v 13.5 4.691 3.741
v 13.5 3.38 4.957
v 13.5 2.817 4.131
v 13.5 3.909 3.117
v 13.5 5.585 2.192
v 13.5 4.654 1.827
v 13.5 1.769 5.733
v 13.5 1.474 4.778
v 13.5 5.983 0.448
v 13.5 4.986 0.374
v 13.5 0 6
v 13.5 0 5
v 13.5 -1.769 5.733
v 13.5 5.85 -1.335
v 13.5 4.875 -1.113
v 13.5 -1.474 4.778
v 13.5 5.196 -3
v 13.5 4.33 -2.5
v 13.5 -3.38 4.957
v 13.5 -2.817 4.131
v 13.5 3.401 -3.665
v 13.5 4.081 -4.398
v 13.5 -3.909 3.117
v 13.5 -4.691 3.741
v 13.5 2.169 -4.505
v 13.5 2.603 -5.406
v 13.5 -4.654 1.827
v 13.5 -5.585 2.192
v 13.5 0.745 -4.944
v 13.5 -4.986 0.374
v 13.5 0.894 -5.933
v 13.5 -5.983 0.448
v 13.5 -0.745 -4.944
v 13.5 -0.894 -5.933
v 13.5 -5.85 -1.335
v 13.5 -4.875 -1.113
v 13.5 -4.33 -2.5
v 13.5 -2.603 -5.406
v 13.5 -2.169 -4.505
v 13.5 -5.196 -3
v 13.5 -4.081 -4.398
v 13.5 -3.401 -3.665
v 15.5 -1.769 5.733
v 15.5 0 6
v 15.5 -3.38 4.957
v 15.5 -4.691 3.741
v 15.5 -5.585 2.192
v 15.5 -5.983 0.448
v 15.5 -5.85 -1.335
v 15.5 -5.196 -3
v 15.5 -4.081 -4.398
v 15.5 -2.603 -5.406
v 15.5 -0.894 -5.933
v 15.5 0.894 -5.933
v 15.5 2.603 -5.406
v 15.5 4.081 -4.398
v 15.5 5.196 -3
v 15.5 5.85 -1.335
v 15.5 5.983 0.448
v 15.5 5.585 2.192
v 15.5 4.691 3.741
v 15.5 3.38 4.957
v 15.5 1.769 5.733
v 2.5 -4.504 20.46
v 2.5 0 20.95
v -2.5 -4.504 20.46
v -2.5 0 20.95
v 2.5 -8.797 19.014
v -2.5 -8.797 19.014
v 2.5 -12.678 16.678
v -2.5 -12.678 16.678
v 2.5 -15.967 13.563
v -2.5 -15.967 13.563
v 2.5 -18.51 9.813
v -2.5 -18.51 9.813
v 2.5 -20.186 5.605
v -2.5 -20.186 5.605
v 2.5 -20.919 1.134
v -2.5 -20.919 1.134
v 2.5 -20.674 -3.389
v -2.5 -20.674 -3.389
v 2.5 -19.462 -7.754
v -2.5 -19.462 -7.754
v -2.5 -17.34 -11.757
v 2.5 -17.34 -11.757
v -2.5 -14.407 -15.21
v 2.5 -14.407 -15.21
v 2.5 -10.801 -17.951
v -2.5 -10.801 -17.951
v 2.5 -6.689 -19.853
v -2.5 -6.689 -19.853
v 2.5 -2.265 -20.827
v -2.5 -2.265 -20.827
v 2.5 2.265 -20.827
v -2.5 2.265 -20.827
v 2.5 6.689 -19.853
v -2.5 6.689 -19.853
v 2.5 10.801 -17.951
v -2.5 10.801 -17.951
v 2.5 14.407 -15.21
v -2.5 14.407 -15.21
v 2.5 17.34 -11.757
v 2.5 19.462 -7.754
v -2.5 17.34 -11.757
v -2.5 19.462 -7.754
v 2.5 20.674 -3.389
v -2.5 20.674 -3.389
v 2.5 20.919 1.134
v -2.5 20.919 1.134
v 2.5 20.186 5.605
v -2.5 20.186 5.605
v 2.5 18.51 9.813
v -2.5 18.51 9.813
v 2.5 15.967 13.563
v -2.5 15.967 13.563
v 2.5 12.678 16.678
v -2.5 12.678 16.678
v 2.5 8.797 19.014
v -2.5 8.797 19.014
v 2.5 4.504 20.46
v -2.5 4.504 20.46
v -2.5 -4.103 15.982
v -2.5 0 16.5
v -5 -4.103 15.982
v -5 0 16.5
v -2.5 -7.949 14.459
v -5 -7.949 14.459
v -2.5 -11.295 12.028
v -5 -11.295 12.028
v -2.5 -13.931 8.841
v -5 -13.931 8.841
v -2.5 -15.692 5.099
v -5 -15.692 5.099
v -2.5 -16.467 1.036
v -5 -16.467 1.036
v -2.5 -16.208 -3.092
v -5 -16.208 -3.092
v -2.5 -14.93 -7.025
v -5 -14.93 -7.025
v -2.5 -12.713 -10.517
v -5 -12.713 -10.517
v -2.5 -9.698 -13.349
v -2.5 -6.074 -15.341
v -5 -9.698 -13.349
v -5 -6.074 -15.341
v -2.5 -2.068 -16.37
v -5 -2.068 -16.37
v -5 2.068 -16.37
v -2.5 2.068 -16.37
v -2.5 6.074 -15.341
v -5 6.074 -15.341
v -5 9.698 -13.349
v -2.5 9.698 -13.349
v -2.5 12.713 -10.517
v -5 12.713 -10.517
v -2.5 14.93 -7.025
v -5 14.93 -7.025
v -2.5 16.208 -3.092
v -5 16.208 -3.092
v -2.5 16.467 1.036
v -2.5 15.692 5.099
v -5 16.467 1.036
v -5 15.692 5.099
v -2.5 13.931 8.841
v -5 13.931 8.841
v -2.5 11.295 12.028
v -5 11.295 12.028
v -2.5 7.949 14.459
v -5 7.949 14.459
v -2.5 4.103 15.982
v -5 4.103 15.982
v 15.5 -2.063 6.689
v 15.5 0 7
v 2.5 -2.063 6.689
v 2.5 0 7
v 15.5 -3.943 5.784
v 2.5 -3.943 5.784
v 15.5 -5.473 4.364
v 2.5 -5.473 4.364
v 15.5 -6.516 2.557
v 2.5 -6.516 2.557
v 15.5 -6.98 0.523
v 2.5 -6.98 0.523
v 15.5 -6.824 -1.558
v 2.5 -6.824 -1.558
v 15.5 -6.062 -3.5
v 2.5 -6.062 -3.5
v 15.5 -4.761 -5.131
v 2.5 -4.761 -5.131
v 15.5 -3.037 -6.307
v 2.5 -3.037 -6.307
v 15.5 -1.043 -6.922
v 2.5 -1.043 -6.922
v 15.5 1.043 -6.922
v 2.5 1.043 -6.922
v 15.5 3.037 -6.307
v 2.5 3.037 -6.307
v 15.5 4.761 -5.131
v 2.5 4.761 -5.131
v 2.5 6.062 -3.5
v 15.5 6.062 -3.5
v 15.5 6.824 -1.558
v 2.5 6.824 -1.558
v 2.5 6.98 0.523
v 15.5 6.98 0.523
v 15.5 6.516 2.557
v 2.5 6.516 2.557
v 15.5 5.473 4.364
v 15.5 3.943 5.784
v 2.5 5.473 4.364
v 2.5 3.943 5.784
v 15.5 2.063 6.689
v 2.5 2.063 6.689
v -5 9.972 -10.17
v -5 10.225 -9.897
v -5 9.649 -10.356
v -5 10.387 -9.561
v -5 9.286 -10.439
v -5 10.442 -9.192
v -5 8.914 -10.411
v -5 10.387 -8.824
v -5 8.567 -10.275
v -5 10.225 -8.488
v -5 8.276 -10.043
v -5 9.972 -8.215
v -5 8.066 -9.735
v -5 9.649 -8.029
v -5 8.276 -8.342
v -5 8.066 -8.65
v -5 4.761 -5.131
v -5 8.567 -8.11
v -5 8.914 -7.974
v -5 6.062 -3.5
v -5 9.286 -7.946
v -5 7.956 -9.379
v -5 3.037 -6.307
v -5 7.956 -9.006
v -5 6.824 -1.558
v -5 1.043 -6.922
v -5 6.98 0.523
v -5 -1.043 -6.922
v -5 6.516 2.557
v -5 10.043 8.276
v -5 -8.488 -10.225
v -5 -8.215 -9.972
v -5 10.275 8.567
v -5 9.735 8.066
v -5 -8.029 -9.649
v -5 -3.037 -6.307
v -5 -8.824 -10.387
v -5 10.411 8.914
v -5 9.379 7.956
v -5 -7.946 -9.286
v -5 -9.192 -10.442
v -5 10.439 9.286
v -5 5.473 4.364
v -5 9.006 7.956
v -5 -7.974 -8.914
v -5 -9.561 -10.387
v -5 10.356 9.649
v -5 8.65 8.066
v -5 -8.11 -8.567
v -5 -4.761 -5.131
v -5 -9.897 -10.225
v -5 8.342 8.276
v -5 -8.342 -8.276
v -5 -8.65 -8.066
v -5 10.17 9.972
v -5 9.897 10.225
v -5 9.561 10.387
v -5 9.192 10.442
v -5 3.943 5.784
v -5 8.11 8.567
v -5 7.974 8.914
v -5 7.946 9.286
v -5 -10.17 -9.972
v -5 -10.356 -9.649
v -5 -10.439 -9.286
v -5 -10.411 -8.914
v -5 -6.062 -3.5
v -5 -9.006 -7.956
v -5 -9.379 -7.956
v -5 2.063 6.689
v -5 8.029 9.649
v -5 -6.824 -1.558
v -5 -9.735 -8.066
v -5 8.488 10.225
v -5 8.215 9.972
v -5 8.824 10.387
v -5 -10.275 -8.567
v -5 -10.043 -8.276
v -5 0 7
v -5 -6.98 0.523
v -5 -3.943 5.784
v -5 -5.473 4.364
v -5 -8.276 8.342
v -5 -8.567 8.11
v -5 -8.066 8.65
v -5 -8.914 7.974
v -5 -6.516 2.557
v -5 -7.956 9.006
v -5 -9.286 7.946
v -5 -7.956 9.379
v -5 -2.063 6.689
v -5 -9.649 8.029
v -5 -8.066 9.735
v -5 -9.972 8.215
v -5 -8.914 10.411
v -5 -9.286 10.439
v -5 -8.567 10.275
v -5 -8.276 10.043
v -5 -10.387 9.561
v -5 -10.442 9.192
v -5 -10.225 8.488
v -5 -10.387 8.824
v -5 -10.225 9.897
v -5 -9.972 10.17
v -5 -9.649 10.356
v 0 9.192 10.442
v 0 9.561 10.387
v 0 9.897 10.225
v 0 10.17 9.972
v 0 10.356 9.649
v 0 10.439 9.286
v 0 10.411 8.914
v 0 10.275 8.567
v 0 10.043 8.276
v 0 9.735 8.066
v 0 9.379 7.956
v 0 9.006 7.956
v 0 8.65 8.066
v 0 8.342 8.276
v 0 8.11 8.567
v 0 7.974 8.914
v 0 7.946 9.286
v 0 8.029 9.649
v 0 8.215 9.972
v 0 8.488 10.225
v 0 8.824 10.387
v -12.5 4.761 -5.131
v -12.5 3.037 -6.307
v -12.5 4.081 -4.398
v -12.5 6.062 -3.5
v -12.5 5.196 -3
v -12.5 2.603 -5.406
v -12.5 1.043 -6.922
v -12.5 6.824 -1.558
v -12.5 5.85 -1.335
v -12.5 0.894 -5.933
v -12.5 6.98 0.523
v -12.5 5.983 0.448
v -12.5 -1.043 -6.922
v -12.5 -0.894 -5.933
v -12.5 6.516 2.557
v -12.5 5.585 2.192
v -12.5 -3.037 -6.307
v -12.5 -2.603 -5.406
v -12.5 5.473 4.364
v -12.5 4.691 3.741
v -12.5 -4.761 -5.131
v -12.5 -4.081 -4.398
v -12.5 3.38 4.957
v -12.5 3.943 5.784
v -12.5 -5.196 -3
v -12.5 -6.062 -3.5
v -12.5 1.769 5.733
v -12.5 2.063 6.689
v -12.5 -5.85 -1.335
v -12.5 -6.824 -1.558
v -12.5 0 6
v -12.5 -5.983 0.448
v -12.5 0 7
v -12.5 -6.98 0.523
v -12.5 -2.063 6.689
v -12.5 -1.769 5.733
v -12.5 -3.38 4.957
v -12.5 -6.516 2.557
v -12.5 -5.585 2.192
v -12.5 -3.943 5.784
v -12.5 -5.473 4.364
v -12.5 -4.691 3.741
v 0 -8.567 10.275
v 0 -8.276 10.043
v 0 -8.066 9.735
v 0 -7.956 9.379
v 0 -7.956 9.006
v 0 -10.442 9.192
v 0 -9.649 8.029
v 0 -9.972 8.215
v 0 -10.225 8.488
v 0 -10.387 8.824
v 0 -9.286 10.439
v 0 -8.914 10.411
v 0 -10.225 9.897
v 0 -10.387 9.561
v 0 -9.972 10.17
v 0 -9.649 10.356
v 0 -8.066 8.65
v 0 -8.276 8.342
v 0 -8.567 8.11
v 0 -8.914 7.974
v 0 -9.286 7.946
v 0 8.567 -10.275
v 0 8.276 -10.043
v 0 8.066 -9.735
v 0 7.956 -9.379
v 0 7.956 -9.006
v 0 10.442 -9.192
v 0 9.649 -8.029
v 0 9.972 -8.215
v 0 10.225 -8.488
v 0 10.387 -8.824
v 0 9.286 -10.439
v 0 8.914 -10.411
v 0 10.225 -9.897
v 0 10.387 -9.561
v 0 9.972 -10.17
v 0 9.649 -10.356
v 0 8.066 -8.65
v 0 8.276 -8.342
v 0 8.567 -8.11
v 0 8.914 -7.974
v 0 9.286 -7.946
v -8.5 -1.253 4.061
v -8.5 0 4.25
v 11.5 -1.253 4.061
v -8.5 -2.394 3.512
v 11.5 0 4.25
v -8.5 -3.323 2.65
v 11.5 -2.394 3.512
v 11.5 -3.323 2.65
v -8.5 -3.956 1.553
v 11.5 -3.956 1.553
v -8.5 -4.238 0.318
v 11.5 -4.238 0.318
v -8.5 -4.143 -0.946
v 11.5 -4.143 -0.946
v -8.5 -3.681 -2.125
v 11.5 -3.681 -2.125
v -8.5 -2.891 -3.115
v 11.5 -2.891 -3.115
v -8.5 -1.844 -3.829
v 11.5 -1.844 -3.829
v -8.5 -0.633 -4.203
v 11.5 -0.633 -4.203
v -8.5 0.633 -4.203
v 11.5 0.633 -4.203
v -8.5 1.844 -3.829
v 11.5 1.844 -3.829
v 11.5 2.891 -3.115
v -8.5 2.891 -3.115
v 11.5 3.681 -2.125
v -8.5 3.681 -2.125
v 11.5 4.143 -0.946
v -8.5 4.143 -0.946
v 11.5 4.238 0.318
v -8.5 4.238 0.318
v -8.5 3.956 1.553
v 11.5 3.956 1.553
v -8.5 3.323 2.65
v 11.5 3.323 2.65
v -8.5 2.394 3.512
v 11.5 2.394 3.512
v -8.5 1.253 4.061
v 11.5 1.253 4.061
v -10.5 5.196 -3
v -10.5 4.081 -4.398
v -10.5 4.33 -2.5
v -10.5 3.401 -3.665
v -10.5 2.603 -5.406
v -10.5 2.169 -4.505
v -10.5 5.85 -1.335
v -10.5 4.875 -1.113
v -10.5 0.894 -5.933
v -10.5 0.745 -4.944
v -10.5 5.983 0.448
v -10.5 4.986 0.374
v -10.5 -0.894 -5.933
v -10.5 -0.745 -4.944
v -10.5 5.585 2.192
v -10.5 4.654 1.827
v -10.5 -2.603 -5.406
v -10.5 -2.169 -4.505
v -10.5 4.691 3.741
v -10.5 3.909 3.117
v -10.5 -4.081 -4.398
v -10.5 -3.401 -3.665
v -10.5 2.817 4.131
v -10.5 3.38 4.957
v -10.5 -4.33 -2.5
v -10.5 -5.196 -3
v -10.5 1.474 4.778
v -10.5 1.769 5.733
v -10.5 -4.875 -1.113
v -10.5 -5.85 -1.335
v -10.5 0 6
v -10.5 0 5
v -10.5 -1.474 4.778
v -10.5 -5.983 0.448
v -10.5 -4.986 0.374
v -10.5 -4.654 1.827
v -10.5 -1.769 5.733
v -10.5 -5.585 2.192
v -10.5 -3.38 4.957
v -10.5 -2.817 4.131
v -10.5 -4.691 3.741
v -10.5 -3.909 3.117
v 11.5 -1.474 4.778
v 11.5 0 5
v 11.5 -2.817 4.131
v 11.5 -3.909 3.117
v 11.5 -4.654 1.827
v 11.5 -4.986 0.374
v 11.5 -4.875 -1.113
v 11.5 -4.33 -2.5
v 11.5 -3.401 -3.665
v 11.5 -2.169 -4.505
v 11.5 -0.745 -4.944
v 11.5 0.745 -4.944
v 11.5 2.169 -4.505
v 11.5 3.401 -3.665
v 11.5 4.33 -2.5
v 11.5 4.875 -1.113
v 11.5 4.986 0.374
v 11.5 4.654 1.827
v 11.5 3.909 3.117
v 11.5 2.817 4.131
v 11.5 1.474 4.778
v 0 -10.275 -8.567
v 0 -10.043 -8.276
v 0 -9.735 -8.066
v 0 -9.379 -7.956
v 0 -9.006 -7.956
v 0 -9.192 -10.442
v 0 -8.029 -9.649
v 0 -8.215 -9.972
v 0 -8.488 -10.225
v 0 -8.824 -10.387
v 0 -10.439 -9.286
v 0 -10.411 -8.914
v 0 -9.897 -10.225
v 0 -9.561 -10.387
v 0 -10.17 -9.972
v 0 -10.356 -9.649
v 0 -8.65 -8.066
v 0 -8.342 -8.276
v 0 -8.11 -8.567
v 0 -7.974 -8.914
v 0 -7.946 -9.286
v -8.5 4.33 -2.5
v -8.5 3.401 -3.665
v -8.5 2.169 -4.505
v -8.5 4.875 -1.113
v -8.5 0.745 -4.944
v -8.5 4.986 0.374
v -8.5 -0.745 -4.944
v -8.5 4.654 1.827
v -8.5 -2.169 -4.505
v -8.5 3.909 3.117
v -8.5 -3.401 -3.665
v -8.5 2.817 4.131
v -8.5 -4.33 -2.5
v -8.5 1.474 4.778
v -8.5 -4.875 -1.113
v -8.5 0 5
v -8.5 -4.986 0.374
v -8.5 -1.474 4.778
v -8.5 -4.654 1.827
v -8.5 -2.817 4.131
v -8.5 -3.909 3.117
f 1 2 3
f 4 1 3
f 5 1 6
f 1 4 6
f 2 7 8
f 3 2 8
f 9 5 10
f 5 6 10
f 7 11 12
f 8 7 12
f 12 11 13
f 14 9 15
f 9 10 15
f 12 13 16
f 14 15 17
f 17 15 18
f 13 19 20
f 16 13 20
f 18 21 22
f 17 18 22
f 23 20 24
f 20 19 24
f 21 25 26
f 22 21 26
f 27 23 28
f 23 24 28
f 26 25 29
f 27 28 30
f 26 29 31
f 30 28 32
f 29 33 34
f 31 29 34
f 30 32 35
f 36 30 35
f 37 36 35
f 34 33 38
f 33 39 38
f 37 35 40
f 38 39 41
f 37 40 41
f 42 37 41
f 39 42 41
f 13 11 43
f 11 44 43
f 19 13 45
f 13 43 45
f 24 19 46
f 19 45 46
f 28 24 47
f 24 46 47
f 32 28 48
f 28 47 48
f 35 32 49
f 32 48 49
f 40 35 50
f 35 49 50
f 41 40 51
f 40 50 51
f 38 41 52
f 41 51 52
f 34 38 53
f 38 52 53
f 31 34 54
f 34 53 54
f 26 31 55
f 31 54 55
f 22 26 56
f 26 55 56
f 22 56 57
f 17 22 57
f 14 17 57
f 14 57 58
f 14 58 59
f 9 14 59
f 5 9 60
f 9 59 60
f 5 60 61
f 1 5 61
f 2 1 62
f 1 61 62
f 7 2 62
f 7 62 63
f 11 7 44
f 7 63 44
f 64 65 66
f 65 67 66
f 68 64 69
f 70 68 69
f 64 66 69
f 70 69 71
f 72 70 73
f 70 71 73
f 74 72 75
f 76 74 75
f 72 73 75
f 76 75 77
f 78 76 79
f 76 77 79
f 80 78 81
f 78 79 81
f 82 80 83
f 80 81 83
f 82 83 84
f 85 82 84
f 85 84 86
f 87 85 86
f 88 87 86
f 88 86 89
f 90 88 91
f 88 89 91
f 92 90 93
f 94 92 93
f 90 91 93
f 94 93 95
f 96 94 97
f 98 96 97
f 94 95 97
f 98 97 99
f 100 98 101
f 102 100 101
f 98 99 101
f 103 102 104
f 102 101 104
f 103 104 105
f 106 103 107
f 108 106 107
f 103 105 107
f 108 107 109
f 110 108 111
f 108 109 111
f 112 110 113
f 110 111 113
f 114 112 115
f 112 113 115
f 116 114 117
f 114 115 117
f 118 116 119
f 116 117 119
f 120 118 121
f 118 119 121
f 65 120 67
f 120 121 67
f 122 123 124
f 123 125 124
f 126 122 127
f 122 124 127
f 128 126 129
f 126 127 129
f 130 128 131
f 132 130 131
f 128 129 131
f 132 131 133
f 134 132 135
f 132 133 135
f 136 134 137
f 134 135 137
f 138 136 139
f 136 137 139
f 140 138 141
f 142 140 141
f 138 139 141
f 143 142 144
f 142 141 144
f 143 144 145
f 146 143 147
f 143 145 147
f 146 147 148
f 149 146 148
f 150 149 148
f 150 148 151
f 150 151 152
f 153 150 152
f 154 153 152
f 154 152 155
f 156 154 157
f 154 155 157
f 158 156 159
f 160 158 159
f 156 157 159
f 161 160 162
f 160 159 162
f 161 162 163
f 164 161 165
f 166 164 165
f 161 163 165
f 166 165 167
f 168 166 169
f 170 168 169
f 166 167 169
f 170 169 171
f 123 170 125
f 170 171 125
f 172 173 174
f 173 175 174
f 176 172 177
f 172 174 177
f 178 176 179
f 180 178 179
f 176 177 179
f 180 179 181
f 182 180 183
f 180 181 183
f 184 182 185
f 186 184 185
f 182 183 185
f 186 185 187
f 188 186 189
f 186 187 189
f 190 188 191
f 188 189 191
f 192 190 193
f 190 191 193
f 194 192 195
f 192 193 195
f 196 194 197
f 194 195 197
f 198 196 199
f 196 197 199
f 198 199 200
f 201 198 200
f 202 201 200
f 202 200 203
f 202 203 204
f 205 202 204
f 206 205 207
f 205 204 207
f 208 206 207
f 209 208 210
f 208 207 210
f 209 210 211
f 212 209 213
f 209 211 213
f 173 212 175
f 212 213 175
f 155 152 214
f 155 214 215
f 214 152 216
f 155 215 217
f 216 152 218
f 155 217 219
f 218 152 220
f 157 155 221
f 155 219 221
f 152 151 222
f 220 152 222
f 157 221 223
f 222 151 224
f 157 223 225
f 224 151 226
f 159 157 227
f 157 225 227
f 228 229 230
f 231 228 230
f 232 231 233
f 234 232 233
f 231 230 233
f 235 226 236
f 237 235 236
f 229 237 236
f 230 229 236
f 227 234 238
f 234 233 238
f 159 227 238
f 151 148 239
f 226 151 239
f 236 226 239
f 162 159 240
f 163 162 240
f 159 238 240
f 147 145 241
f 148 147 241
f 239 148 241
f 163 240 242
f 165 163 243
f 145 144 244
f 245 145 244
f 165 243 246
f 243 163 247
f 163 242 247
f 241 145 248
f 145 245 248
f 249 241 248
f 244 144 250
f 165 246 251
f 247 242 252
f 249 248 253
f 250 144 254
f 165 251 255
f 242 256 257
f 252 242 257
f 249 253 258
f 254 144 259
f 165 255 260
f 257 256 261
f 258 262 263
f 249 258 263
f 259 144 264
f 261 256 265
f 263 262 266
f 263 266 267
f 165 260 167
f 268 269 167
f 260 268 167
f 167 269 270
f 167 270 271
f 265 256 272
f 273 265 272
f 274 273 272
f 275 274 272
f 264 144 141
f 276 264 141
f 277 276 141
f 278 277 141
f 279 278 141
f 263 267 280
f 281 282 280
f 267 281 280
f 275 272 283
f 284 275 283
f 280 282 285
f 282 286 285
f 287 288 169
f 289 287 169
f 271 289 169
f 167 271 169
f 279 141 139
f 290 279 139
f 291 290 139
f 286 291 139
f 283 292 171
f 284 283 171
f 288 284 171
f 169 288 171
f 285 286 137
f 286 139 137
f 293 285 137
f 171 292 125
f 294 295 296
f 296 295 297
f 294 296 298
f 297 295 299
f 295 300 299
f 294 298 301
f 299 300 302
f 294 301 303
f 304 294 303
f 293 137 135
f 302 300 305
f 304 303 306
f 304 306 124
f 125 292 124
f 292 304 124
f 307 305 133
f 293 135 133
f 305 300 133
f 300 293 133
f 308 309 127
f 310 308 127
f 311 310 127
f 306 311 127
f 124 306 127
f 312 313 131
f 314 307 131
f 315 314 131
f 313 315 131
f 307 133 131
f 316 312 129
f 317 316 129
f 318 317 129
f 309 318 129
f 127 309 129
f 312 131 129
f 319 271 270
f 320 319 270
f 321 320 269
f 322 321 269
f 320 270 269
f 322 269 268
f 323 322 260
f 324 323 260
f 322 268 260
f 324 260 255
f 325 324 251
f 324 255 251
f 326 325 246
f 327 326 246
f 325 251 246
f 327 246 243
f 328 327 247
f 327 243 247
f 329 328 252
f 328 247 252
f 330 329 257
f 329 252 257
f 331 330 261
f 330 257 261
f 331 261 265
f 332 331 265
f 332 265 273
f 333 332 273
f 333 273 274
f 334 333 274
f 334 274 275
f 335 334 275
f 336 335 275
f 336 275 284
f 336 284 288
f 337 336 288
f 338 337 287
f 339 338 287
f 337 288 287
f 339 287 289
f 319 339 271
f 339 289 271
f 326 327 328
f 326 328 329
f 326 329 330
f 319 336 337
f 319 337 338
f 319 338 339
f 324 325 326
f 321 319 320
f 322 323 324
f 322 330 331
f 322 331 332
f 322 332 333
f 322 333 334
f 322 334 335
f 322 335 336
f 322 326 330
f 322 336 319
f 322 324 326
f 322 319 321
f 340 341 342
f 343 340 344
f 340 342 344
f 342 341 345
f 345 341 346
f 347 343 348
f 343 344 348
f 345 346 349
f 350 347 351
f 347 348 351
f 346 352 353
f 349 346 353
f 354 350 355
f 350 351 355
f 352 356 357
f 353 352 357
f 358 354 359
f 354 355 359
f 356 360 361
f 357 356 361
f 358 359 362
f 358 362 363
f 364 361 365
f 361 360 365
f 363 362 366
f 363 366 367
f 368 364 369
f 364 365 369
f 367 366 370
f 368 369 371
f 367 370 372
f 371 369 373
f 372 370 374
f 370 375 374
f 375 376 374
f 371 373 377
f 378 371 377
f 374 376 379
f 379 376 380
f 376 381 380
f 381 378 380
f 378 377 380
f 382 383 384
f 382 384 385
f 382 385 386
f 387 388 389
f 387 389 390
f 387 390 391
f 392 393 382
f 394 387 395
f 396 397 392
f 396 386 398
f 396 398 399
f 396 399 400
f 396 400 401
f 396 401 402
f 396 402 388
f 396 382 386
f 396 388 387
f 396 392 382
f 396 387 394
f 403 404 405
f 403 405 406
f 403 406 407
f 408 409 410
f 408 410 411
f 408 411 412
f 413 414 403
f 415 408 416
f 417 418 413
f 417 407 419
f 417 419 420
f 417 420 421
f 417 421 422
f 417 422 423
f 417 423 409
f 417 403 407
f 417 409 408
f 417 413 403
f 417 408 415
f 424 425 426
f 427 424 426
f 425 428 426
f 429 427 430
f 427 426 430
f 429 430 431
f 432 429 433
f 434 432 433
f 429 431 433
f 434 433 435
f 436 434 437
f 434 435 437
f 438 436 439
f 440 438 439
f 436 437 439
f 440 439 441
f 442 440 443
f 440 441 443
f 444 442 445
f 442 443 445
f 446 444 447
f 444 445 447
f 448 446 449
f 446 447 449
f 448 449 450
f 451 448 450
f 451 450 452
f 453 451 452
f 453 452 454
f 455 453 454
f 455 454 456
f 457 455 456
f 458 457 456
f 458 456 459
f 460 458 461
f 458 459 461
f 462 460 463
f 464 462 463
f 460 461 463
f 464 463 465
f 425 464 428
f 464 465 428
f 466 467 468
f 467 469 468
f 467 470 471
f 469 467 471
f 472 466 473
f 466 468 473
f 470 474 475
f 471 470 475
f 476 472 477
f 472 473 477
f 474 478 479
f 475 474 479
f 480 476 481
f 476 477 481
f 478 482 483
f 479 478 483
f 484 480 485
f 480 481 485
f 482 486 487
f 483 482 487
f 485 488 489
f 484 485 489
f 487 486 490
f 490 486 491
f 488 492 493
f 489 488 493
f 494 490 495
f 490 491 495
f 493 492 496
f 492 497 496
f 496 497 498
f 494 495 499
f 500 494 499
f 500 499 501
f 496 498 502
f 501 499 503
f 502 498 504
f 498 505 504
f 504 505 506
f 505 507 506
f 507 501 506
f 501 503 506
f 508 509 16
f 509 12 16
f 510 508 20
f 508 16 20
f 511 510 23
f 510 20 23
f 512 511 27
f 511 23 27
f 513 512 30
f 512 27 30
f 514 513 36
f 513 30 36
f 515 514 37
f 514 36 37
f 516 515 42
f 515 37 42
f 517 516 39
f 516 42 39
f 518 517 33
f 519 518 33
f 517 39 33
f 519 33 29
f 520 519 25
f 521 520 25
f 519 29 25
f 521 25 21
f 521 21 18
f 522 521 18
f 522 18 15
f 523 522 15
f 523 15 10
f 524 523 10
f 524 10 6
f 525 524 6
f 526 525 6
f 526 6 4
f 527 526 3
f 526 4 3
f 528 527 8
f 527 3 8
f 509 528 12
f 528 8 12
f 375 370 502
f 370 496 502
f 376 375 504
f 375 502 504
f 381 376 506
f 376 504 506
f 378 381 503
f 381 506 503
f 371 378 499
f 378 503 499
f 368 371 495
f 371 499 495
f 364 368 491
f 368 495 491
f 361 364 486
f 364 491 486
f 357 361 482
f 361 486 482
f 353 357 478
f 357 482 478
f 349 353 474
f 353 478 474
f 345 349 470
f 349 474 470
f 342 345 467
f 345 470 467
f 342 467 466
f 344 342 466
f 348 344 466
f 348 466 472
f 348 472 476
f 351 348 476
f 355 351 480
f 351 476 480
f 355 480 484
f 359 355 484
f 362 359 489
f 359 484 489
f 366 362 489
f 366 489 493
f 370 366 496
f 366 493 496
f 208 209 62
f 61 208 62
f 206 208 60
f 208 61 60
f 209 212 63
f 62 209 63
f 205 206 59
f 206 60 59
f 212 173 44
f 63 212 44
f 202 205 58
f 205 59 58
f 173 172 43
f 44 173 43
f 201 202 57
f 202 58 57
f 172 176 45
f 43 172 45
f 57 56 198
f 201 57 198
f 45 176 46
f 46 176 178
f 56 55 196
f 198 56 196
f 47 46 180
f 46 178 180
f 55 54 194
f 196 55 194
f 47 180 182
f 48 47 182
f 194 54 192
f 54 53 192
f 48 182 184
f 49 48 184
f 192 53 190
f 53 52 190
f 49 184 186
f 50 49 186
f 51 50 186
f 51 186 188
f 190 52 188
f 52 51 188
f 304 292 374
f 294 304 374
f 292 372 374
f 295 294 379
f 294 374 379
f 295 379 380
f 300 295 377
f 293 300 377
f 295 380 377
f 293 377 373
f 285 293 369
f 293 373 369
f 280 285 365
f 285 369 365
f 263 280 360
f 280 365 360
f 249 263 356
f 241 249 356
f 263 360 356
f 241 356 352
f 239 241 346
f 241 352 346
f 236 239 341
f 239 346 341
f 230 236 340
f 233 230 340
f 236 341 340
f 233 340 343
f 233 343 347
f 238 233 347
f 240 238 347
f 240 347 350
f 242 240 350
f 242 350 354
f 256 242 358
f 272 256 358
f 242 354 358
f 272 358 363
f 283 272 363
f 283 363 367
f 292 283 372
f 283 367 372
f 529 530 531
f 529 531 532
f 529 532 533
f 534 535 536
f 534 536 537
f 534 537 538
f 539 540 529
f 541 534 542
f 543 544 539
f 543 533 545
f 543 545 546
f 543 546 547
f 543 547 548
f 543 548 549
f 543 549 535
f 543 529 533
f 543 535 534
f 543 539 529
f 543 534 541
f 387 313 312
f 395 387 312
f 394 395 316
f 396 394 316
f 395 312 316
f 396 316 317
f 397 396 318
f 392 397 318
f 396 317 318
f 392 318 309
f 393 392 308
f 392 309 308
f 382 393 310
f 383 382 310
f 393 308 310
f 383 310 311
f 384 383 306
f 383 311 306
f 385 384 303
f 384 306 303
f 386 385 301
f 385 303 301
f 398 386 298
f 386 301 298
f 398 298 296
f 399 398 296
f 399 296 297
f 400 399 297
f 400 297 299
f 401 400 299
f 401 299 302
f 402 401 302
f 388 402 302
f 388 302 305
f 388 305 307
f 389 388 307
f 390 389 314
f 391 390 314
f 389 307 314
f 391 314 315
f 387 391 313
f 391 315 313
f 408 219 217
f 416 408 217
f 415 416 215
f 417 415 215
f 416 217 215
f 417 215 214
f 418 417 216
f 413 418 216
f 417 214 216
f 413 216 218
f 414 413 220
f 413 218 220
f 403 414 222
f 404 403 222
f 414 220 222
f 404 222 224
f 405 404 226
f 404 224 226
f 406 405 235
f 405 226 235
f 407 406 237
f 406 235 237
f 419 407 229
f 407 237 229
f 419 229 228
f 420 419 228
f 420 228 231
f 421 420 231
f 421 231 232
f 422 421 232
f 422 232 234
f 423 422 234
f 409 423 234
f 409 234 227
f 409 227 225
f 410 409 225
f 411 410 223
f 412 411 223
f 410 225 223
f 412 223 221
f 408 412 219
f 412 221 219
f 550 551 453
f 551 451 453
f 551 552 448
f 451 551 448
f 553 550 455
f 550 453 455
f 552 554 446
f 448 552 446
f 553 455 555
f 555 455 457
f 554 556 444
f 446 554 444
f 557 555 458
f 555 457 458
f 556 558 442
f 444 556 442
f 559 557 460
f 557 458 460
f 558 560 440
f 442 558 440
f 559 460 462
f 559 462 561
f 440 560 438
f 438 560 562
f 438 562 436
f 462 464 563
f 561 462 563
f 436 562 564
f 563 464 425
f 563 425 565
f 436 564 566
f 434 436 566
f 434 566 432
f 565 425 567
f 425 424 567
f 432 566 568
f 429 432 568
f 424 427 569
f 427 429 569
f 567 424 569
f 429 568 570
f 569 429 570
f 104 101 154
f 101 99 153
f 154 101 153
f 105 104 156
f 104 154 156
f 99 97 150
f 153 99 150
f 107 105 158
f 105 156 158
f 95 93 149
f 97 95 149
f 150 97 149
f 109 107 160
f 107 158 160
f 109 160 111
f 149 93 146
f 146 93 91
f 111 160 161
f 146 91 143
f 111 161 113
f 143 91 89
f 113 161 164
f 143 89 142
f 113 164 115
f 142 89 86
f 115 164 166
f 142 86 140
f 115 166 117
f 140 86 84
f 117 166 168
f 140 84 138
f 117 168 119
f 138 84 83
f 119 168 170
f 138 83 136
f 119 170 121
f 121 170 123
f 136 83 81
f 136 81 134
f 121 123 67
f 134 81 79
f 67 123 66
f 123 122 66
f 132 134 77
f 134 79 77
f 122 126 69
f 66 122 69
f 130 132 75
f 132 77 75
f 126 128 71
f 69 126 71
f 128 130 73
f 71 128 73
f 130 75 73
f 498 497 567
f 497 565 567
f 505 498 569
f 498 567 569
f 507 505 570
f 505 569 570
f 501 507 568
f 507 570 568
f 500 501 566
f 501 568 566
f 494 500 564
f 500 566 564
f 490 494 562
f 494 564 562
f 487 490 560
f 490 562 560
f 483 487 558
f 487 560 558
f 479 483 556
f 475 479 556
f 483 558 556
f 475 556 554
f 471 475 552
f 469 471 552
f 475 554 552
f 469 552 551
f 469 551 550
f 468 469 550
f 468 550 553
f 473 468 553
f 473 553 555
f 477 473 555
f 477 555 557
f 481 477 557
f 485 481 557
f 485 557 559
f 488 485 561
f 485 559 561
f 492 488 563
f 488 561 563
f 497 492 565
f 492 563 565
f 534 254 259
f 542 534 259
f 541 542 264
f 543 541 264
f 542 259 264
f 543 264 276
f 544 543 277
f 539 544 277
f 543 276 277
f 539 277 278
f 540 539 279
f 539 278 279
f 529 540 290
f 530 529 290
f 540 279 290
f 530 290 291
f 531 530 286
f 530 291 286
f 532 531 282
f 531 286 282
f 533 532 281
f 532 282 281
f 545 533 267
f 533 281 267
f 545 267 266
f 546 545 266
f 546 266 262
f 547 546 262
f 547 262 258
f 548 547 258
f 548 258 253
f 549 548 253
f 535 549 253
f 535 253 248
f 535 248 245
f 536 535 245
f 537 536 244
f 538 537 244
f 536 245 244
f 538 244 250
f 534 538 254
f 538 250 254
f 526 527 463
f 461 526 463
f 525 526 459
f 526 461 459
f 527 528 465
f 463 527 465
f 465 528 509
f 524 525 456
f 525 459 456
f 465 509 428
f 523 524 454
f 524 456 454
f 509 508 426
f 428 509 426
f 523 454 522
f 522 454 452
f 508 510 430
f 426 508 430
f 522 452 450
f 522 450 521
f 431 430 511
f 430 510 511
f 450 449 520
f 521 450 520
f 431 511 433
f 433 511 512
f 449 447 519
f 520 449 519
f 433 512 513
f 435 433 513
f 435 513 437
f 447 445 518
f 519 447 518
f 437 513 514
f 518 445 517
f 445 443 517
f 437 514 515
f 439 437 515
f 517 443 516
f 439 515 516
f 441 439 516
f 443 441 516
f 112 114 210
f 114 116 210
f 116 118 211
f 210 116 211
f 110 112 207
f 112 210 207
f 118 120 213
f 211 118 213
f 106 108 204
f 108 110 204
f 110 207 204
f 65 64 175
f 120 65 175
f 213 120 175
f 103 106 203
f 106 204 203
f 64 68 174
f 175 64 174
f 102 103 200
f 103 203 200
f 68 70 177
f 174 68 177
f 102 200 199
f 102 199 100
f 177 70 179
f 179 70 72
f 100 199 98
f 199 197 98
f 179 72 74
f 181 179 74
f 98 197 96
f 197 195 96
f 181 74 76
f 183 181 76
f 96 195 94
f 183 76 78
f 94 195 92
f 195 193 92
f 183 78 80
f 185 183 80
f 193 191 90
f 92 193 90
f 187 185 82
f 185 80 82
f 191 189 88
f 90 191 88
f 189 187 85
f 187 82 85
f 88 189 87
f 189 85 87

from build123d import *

# Parameters (mm, degrees)
SKETCH2_R              = 1.25
CUT_EXTRUDE_M2_5_DEPTH = 5
CIRPATTERN1_COUNT      = 4


with BuildPart() as part:
    # Sketch1 → Revolve1 (revolve)
    with BuildSketch(Plane.XY, mode=Mode.PRIVATE) as revolve1_sk:
        Polygon((-8.5, 4.25), (-5, 4.25), (-5, 7), (-12.5, 7), (-12.5, 6), (-10.5, 6), (-10.5, 5), (-8.5, 5), align=None)
        Polygon((-2.5, 4.25), (-2.5, 16.5), (-5, 16.5), (-5, 7), (-5, 4.25), align=None)
        Polygon((2.5, 20.95), (-2.5, 20.95), (-2.5, 16.5), (-2.5, 4.25), (2.5, 4.25), (2.5, 7), align=None)
        Polygon((15.5, 7), (2.5, 7), (2.5, 4.25), (11.5, 4.25), (11.5, 5), (13.5, 5), (13.5, 6), (15.5, 6), align=None)
    revolve(revolve1_sk.sketch.rotate(Axis((0, 0, 0), (1, 0, 0)), 90), axis=Axis((0, 0, 0), (1, 0, 0)))

    # Sketch2 → Cut-Extrude M2.5 (cut)
    with BuildSketch(Plane.ZY.offset(5)):
        with Locations((9.192388155, 9.192388155)):
            Circle(SKETCH2_R)
    cut_extrude_m2_5 = extrude(amount=-CUT_EXTRUDE_M2_5_DEPTH, mode=Mode.SUBTRACT)

    # CirPattern1: Cut-Extrude M2.5 ×4 about axis
    cirpattern1_axis = Axis((0, 0, 0), (1, 0, 0))
    for i in range(1, CIRPATTERN1_COUNT):
        add(cut_extrude_m2_5.rotate(cirpattern1_axis, i * 360 / CIRPATTERN1_COUNT), mode=Mode.SUBTRACT)


solid = part.part
